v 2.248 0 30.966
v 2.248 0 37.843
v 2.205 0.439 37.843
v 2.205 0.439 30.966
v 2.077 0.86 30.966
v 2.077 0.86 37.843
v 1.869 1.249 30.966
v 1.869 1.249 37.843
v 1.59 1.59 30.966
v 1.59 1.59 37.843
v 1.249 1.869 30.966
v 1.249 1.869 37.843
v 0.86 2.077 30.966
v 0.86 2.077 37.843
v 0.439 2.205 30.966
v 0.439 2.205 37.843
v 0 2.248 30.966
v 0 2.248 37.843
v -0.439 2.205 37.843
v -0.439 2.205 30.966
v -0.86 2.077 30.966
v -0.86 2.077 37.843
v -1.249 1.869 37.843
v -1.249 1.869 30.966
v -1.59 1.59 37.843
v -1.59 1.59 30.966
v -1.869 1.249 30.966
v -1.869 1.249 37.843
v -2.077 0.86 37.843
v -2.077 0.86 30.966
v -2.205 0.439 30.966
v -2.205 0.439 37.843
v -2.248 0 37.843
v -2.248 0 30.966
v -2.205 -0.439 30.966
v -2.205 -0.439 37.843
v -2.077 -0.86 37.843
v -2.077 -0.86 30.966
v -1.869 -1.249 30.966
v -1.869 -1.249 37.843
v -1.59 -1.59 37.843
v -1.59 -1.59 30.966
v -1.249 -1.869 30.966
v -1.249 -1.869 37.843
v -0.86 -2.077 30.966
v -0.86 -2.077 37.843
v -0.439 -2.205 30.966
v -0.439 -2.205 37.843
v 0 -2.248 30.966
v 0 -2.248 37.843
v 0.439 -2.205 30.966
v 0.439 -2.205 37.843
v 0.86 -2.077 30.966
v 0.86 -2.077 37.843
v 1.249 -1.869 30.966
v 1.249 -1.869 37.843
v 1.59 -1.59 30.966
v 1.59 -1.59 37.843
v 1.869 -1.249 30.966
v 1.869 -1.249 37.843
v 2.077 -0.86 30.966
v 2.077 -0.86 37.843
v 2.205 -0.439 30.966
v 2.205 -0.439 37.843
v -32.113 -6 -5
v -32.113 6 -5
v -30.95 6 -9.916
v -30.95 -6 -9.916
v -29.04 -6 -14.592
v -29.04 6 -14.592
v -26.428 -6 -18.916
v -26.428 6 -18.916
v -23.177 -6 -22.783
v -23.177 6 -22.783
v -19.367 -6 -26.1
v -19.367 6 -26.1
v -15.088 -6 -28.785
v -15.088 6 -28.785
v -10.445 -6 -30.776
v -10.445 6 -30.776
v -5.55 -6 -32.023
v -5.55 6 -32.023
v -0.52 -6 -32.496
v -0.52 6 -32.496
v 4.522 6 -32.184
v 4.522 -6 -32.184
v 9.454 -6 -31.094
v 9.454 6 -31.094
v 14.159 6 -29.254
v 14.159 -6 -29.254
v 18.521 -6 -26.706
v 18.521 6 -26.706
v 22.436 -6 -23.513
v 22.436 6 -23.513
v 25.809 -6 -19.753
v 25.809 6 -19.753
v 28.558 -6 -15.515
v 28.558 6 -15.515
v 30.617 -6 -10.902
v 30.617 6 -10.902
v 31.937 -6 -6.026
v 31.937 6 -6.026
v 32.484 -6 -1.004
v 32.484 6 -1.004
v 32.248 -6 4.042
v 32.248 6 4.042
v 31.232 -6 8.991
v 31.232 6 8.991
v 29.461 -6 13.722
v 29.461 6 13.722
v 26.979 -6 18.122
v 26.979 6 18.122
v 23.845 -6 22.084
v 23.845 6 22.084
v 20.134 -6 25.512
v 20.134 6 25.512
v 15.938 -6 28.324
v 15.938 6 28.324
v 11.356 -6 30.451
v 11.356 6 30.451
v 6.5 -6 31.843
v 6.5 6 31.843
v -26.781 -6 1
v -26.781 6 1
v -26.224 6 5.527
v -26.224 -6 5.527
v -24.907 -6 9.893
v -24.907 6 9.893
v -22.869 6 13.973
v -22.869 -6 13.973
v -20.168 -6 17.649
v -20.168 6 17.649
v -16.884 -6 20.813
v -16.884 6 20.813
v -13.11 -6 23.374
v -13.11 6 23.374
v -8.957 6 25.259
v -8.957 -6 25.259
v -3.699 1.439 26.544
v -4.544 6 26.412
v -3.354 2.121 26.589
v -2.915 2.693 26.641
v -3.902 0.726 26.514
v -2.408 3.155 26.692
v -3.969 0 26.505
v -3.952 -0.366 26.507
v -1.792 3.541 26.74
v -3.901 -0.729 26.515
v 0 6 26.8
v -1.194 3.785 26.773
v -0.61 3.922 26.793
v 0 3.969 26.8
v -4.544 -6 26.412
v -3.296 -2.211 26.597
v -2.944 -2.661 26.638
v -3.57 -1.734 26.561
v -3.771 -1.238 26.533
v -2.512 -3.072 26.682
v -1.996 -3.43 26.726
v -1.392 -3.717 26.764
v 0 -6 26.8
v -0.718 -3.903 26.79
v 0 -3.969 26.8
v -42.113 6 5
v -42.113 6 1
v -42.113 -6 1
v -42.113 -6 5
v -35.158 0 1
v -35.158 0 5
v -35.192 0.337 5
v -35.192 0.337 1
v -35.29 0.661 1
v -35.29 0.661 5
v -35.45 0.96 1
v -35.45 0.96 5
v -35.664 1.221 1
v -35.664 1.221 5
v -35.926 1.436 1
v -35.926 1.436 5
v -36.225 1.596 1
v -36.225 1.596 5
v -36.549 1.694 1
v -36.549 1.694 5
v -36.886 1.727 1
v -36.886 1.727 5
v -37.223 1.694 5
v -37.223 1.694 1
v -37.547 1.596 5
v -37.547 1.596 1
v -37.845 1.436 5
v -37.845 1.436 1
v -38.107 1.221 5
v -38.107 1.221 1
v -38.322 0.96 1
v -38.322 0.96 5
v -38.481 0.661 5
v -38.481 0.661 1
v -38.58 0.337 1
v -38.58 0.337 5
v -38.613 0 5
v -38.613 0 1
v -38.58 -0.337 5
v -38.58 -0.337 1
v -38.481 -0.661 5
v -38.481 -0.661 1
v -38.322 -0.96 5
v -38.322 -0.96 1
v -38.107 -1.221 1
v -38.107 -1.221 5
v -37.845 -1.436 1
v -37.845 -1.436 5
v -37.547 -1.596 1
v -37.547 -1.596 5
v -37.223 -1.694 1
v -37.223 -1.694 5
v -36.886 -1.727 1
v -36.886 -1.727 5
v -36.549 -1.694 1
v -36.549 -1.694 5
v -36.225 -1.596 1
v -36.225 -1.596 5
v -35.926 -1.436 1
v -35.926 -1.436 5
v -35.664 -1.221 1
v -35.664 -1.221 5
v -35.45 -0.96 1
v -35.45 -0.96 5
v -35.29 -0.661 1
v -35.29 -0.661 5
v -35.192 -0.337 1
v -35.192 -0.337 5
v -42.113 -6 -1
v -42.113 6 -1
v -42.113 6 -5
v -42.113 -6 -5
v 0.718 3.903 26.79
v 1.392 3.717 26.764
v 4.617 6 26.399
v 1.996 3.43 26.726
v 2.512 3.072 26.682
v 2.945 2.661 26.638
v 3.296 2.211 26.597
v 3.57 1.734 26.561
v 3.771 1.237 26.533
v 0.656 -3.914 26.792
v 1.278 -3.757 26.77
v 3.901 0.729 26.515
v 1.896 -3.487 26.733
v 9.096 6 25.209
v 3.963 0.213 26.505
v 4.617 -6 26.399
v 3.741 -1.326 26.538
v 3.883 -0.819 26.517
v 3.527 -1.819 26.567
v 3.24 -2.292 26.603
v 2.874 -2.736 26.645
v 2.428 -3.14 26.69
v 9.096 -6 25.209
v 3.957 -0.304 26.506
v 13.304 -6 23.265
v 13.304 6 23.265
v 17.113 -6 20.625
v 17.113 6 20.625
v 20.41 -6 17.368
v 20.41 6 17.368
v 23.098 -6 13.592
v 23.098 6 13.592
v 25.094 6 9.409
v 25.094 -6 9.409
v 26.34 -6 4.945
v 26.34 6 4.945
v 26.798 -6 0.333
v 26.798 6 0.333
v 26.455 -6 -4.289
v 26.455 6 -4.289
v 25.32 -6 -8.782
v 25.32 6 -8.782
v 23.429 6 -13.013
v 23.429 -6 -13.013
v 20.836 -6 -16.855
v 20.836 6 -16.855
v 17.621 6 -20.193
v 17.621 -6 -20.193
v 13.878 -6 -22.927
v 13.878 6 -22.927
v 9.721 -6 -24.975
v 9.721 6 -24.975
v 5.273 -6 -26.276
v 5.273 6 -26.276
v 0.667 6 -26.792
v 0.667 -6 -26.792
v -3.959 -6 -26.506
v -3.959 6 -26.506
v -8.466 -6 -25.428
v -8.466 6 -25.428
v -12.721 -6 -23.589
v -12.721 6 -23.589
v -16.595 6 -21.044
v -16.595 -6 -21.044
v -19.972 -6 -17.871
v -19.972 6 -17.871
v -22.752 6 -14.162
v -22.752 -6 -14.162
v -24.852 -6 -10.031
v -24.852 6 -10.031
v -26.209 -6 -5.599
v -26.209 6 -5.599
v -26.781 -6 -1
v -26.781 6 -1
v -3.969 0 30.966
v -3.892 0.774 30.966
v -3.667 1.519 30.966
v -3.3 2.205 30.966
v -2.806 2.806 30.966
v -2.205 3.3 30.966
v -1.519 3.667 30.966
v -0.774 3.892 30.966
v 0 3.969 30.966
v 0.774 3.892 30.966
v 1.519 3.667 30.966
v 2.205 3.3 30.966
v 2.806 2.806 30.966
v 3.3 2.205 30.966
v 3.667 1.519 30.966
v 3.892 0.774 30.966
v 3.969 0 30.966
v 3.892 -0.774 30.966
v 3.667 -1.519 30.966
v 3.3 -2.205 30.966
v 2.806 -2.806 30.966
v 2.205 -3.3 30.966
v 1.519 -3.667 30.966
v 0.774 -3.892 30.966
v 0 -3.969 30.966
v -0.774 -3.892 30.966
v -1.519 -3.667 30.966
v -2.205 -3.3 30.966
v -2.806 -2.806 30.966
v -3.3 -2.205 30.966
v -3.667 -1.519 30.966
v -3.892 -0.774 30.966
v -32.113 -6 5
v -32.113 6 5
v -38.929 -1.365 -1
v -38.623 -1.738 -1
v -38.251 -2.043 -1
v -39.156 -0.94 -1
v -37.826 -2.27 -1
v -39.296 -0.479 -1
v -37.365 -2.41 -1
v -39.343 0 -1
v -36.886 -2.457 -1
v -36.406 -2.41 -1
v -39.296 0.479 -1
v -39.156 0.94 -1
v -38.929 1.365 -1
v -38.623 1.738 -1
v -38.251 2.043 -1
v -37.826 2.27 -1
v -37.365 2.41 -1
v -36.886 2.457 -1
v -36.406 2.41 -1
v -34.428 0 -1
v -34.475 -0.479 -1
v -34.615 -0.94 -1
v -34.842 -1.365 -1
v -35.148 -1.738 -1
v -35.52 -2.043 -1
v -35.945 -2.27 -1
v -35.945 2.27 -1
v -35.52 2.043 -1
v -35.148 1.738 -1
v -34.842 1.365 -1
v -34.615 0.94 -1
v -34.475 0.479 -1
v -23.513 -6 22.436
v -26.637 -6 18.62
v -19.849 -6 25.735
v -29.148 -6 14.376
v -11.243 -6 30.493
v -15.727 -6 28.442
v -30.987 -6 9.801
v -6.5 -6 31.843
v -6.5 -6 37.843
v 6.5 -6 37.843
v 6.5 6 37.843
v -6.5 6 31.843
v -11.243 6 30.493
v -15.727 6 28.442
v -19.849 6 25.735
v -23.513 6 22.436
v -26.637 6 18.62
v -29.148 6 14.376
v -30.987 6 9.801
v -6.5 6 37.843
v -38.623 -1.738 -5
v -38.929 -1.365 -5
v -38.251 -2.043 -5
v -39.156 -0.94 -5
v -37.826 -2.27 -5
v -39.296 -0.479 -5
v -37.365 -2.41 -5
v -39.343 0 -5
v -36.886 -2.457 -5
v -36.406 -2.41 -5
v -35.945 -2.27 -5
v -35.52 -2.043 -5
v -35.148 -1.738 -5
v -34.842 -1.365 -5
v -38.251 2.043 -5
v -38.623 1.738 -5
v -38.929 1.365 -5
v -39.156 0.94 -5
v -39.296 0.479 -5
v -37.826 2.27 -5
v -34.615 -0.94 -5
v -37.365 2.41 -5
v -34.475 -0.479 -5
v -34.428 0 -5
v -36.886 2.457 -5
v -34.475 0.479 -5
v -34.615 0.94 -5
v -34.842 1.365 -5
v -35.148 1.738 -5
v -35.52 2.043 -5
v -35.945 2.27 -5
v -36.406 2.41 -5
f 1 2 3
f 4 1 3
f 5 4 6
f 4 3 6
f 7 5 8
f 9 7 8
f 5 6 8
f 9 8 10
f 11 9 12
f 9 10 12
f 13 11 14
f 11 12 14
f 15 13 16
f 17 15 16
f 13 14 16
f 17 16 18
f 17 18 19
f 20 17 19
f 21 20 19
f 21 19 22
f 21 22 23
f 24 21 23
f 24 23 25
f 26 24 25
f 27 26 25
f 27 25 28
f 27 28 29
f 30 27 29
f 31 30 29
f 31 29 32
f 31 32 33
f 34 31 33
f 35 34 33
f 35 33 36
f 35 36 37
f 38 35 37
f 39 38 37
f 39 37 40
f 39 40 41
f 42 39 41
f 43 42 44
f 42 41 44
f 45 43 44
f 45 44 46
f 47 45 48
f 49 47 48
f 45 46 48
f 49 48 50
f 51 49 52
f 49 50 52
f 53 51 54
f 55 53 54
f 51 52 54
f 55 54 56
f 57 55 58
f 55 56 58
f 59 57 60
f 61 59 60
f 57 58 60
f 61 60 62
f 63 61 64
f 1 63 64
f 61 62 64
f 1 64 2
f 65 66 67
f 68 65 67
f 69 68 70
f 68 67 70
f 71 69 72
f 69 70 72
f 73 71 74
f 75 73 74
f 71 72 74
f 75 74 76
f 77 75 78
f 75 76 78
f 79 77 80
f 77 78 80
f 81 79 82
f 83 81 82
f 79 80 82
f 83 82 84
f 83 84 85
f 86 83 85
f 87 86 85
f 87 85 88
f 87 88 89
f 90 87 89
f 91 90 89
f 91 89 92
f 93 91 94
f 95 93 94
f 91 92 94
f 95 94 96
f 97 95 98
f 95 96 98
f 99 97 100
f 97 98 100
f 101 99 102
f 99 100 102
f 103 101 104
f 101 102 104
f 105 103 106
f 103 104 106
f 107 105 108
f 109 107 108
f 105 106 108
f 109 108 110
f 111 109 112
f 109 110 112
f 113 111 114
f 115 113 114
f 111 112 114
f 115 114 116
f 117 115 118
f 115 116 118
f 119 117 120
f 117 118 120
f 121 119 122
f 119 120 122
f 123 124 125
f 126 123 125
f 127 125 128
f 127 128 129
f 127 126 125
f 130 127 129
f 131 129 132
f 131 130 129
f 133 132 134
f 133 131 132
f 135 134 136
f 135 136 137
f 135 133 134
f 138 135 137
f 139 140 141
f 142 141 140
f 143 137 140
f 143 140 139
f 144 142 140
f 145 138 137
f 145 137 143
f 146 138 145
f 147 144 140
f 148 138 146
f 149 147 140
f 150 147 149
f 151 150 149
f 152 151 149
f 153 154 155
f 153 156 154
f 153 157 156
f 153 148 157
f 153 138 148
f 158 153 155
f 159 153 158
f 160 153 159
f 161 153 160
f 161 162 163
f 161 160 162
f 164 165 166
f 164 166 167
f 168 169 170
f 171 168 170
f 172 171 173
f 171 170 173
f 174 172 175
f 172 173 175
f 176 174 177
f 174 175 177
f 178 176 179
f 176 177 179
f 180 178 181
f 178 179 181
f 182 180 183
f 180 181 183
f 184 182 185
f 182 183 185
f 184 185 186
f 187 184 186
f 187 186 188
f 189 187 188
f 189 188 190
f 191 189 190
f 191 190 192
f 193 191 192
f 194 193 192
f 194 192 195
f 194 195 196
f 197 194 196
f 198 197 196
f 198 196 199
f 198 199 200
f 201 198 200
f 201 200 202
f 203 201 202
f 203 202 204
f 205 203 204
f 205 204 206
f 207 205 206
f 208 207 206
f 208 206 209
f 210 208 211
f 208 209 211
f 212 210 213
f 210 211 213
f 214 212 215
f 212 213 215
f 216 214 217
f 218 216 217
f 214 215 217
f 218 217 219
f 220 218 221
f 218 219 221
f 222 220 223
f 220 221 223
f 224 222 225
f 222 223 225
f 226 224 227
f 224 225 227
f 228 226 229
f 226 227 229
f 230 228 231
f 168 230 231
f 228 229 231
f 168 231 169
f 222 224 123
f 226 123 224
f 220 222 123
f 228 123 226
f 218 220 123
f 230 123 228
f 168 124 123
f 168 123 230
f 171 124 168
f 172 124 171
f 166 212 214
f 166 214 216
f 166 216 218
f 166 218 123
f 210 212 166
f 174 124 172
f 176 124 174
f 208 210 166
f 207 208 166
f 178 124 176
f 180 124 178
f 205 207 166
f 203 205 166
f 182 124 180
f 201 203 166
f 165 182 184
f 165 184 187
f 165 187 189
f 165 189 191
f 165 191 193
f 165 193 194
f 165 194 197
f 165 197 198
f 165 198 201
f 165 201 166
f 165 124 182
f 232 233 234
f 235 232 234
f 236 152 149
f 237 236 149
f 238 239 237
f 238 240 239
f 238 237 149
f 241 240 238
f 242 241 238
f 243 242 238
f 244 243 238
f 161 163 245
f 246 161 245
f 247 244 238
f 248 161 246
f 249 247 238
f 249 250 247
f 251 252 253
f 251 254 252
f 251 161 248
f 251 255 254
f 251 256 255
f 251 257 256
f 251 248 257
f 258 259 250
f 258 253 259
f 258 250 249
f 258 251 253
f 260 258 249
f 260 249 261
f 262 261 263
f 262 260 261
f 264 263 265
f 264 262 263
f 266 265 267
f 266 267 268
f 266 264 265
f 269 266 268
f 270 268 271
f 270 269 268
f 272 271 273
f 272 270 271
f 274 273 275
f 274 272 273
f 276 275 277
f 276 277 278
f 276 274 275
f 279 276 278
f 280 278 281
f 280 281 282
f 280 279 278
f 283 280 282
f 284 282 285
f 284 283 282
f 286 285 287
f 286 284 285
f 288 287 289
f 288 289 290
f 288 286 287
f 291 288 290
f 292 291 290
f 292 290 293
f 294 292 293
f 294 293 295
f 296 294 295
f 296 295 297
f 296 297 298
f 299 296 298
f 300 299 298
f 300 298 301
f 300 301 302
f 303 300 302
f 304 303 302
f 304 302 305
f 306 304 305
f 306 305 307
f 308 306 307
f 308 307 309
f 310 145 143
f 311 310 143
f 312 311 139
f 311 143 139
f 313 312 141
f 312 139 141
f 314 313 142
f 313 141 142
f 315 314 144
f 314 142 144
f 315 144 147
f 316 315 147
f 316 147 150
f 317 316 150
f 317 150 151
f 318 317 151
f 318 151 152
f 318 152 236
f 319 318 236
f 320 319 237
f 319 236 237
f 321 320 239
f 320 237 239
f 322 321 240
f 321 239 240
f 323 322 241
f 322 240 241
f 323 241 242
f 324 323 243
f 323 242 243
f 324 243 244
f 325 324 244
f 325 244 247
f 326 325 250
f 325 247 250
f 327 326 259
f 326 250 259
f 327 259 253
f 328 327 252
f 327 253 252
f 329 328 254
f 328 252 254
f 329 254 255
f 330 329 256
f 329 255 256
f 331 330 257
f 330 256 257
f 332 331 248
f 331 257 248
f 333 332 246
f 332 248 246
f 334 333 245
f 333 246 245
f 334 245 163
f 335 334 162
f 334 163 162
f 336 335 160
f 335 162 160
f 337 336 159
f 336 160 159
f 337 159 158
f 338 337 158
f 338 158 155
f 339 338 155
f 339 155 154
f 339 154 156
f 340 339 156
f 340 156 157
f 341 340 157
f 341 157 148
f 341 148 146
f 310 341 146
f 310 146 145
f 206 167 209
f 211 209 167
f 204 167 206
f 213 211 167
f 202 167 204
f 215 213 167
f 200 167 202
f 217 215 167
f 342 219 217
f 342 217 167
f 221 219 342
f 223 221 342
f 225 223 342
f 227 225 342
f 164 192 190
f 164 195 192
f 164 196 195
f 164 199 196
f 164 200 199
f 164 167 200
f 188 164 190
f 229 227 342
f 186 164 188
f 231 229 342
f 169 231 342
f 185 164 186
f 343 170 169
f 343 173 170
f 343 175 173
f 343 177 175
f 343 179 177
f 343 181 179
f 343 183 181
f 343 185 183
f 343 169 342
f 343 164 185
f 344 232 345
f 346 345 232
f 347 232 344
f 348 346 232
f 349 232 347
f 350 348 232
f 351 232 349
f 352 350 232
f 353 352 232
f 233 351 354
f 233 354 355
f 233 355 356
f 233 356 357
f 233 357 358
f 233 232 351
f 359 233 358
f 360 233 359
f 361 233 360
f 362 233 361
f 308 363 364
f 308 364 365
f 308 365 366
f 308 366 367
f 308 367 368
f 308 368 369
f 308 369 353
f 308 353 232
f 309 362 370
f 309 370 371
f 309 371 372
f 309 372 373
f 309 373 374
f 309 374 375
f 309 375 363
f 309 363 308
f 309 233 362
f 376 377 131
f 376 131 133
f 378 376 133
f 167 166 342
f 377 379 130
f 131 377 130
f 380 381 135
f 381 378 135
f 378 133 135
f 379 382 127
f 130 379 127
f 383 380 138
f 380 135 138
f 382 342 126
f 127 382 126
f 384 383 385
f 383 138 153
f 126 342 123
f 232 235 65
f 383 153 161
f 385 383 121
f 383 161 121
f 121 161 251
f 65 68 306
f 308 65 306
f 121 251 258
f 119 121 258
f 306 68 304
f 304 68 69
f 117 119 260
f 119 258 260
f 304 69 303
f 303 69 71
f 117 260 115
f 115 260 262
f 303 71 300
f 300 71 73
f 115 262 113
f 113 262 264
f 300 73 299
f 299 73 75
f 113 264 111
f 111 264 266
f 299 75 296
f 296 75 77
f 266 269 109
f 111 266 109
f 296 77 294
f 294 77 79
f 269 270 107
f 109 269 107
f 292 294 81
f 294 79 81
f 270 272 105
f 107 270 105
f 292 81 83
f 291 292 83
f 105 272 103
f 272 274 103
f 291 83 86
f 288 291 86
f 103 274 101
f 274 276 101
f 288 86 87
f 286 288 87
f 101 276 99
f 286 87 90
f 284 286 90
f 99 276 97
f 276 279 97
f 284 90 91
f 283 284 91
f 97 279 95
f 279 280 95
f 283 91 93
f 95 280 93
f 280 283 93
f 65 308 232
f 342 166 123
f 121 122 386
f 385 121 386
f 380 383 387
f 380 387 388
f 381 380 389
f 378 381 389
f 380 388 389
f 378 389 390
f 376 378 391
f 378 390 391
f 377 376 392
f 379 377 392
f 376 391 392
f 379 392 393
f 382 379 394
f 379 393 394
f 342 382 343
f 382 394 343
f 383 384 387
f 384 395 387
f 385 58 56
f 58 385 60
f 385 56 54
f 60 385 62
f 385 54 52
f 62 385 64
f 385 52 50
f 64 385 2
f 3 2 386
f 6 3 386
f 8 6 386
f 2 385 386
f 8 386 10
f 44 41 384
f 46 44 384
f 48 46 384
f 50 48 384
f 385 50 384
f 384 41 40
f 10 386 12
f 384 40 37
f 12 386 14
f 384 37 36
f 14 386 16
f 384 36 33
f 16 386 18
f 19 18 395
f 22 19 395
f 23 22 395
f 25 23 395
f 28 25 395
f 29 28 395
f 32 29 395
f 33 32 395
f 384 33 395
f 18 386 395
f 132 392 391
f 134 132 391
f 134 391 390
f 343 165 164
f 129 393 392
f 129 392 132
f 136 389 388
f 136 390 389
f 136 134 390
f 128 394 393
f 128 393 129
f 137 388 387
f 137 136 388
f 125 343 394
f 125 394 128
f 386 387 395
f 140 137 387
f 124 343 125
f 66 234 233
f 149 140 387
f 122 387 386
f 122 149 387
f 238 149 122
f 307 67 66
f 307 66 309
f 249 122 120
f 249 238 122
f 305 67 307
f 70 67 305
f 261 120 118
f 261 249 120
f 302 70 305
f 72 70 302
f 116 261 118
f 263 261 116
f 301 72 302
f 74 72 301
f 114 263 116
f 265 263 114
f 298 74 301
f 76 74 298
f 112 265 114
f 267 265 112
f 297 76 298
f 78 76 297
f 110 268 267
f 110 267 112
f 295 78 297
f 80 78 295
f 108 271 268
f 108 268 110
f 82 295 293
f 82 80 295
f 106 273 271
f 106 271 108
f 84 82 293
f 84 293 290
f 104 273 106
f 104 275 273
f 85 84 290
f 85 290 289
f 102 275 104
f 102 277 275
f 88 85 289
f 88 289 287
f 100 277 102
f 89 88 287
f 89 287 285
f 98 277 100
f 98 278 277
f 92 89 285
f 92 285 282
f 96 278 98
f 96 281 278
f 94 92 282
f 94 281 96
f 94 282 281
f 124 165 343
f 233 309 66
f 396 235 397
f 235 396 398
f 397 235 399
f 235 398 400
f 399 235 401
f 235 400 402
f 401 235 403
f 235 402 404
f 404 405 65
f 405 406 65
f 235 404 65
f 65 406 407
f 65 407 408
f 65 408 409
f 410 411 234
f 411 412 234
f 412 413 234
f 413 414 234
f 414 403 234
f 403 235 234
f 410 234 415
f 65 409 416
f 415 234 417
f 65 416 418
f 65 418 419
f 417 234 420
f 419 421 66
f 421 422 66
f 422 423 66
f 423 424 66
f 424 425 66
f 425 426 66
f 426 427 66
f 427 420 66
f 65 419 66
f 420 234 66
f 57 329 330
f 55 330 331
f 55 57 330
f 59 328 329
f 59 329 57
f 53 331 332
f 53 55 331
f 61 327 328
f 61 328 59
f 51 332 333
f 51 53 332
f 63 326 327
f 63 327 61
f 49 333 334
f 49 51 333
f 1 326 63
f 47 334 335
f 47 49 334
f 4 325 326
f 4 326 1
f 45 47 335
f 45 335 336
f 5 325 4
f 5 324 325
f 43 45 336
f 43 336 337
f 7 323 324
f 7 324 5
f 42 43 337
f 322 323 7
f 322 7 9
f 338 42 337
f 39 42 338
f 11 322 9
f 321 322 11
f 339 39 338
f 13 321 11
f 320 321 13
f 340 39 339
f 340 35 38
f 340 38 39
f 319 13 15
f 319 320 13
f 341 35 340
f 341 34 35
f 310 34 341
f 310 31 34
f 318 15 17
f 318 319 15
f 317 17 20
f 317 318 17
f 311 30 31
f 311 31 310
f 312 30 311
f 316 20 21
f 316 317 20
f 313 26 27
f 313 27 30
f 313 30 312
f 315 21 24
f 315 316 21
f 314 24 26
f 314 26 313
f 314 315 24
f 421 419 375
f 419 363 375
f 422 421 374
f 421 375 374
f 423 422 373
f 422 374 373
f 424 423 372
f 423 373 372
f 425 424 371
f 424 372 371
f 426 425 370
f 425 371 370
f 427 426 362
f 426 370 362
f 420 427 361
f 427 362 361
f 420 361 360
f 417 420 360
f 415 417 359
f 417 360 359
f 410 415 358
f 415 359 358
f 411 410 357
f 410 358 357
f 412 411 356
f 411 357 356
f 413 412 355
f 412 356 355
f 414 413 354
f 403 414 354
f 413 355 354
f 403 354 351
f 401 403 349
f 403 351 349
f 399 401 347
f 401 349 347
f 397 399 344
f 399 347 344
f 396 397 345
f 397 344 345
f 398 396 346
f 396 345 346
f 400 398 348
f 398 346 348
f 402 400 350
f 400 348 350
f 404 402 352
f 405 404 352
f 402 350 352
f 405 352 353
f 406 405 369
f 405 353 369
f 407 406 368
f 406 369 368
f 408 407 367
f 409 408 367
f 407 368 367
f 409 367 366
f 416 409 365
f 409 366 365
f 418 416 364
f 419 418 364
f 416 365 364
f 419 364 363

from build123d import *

# Parameters (mm, degrees)
SKETCH1_R                                      = 26.8
BOSS_EXTRUDE1_DEPTH                            = 6
CBORE_FOR_8_SOCKET_HEAD_CAP_SCREW1_D           = 4.4958
CBORE_FOR_8_SOCKET_HEAD_CAP_SCREW1_DEPTH       = 11.043366656
CBORE_FOR_8_SOCKET_HEAD_CAP_SCREW1_CBORE_D     = 7.9375
CBORE_FOR_8_SOCKET_HEAD_CAP_SCREW1_CBORE_DEPTH = 4.1656
SKETCH3_W                                      = 37.2978219
SKETCH3_H                                      = 2
CUT_EXTRUDE1_DEPTH                             = 12
BOSS_EXTRUDE2_DEPTH                            = 12
F_8_32_TAPPED_HOLE1_D                          = 3.4544
F_8_CLEARANCE_HOLE1_D                          = 4.9149
F_8_CLEARANCE_HOLE1_DEPTH                      = 4
F_8_CLEARANCE_HOLE1_TIP                        = 1.476584928


with BuildPart() as part:
    # Sketch1 → Boss-Extrude1 (new, symmetric)
    with BuildSketch(Plane(origin=(0, 0, 0), x_dir=(1, 0, 0), z_dir=(0, 1, 0))):
        with BuildLine():
            Line((6.5, -31.843366656), (6.5, -37.843366656))
            Line((6.5, -37.843366656), (-6.5, -37.843366656))
            Line((-6.5, -37.843366656), (-6.5, -31.843366656))
            ThreePointArc((-6.5, -31.843366656), (0, 32.5), (6.5, -31.843366656))
        make_face()
        with Locations(Location((0, 0, 0), (0, 0, 270))):
            Circle(SKETCH1_R, mode=Mode.SUBTRACT)
    extrude(amount=BOSS_EXTRUDE1_DEPTH, both=True)

    # CBORE for #8 Socket Head Cap Screw1
    with Locations(Plane(origin=(0, 0, 26.8), x_dir=(-1, 0, 0), z_dir=(0, 0, -1))):
        with Locations((0, 0)):
            CounterBoreHole(CBORE_FOR_8_SOCKET_HEAD_CAP_SCREW1_D / 2, CBORE_FOR_8_SOCKET_HEAD_CAP_SCREW1_CBORE_D / 2, CBORE_FOR_8_SOCKET_HEAD_CAP_SCREW1_CBORE_DEPTH, depth=CBORE_FOR_8_SOCKET_HEAD_CAP_SCREW1_DEPTH)

    # Sketch3 → Cut-Extrude1 (cut)
    with BuildSketch(Plane(origin=(0, 6, 0), x_dir=(1, 0, 0), z_dir=(0, 1, 0))):
        with Locations((-18.64891095, 0)):
            Rectangle(SKETCH3_W, SKETCH3_H)
    extrude(amount=-CUT_EXTRUDE1_DEPTH, mode=Mode.SUBTRACT)

    # Sketch4 → Boss-Extrude2 (add)
    with BuildSketch(Plane(origin=(0, 6, 0), x_dir=(1, 0, 0), z_dir=(0, 1, 0))):
        with BuildLine():
            Line((-32.484611742, -1), (-42.113081447, -1))
            Line((-42.113081447, -1), (-42.113081447, -5))
            Line((-42.113081447, -5), (-32.113081447, -5))
            ThreePointArc((-32.113081447, -5), (-32.360709067, -3.005745946), (-32.484611742, -1))
        make_face()
        with BuildLine():
            Line((-32.484611742, 1), (-42.113081447, 1))
            Line((-42.113081447, 1), (-42.113081447, 5))
            Line((-42.113081447, 5), (-32.113081447, 5))
            ThreePointArc((-32.113081447, 5), (-32.360709067, 3.005745946), (-32.484611742, 1))
        make_face()
    extrude(amount=-BOSS_EXTRUDE2_DEPTH)

    # #8-32 Tapped Hole1 (through all)
    with Locations(Plane(origin=(0, 0, -5), x_dir=(-1, 0, 0), z_dir=(0, 0, -1))):
        with Locations((36.885640573, 0)):
            Hole(F_8_32_TAPPED_HOLE1_D / 2)

    # #8 Clearance Hole1
    with Locations(Plane(origin=(0, 0, -5), x_dir=(-1, 0, 0), z_dir=(0, 0, -1))):
        with Locations((36.885640573, 0)):
            Hole(F_8_CLEARANCE_HOLE1_D / 2, depth=F_8_CLEARANCE_HOLE1_DEPTH)
            with Locations((0, 0, -(F_8_CLEARANCE_HOLE1_DEPTH + F_8_CLEARANCE_HOLE1_TIP / 2))):  # 118° drill point
                Cone(0, F_8_CLEARANCE_HOLE1_D / 2, F_8_CLEARANCE_HOLE1_TIP, mode=Mode.SUBTRACT)


solid = part.part
